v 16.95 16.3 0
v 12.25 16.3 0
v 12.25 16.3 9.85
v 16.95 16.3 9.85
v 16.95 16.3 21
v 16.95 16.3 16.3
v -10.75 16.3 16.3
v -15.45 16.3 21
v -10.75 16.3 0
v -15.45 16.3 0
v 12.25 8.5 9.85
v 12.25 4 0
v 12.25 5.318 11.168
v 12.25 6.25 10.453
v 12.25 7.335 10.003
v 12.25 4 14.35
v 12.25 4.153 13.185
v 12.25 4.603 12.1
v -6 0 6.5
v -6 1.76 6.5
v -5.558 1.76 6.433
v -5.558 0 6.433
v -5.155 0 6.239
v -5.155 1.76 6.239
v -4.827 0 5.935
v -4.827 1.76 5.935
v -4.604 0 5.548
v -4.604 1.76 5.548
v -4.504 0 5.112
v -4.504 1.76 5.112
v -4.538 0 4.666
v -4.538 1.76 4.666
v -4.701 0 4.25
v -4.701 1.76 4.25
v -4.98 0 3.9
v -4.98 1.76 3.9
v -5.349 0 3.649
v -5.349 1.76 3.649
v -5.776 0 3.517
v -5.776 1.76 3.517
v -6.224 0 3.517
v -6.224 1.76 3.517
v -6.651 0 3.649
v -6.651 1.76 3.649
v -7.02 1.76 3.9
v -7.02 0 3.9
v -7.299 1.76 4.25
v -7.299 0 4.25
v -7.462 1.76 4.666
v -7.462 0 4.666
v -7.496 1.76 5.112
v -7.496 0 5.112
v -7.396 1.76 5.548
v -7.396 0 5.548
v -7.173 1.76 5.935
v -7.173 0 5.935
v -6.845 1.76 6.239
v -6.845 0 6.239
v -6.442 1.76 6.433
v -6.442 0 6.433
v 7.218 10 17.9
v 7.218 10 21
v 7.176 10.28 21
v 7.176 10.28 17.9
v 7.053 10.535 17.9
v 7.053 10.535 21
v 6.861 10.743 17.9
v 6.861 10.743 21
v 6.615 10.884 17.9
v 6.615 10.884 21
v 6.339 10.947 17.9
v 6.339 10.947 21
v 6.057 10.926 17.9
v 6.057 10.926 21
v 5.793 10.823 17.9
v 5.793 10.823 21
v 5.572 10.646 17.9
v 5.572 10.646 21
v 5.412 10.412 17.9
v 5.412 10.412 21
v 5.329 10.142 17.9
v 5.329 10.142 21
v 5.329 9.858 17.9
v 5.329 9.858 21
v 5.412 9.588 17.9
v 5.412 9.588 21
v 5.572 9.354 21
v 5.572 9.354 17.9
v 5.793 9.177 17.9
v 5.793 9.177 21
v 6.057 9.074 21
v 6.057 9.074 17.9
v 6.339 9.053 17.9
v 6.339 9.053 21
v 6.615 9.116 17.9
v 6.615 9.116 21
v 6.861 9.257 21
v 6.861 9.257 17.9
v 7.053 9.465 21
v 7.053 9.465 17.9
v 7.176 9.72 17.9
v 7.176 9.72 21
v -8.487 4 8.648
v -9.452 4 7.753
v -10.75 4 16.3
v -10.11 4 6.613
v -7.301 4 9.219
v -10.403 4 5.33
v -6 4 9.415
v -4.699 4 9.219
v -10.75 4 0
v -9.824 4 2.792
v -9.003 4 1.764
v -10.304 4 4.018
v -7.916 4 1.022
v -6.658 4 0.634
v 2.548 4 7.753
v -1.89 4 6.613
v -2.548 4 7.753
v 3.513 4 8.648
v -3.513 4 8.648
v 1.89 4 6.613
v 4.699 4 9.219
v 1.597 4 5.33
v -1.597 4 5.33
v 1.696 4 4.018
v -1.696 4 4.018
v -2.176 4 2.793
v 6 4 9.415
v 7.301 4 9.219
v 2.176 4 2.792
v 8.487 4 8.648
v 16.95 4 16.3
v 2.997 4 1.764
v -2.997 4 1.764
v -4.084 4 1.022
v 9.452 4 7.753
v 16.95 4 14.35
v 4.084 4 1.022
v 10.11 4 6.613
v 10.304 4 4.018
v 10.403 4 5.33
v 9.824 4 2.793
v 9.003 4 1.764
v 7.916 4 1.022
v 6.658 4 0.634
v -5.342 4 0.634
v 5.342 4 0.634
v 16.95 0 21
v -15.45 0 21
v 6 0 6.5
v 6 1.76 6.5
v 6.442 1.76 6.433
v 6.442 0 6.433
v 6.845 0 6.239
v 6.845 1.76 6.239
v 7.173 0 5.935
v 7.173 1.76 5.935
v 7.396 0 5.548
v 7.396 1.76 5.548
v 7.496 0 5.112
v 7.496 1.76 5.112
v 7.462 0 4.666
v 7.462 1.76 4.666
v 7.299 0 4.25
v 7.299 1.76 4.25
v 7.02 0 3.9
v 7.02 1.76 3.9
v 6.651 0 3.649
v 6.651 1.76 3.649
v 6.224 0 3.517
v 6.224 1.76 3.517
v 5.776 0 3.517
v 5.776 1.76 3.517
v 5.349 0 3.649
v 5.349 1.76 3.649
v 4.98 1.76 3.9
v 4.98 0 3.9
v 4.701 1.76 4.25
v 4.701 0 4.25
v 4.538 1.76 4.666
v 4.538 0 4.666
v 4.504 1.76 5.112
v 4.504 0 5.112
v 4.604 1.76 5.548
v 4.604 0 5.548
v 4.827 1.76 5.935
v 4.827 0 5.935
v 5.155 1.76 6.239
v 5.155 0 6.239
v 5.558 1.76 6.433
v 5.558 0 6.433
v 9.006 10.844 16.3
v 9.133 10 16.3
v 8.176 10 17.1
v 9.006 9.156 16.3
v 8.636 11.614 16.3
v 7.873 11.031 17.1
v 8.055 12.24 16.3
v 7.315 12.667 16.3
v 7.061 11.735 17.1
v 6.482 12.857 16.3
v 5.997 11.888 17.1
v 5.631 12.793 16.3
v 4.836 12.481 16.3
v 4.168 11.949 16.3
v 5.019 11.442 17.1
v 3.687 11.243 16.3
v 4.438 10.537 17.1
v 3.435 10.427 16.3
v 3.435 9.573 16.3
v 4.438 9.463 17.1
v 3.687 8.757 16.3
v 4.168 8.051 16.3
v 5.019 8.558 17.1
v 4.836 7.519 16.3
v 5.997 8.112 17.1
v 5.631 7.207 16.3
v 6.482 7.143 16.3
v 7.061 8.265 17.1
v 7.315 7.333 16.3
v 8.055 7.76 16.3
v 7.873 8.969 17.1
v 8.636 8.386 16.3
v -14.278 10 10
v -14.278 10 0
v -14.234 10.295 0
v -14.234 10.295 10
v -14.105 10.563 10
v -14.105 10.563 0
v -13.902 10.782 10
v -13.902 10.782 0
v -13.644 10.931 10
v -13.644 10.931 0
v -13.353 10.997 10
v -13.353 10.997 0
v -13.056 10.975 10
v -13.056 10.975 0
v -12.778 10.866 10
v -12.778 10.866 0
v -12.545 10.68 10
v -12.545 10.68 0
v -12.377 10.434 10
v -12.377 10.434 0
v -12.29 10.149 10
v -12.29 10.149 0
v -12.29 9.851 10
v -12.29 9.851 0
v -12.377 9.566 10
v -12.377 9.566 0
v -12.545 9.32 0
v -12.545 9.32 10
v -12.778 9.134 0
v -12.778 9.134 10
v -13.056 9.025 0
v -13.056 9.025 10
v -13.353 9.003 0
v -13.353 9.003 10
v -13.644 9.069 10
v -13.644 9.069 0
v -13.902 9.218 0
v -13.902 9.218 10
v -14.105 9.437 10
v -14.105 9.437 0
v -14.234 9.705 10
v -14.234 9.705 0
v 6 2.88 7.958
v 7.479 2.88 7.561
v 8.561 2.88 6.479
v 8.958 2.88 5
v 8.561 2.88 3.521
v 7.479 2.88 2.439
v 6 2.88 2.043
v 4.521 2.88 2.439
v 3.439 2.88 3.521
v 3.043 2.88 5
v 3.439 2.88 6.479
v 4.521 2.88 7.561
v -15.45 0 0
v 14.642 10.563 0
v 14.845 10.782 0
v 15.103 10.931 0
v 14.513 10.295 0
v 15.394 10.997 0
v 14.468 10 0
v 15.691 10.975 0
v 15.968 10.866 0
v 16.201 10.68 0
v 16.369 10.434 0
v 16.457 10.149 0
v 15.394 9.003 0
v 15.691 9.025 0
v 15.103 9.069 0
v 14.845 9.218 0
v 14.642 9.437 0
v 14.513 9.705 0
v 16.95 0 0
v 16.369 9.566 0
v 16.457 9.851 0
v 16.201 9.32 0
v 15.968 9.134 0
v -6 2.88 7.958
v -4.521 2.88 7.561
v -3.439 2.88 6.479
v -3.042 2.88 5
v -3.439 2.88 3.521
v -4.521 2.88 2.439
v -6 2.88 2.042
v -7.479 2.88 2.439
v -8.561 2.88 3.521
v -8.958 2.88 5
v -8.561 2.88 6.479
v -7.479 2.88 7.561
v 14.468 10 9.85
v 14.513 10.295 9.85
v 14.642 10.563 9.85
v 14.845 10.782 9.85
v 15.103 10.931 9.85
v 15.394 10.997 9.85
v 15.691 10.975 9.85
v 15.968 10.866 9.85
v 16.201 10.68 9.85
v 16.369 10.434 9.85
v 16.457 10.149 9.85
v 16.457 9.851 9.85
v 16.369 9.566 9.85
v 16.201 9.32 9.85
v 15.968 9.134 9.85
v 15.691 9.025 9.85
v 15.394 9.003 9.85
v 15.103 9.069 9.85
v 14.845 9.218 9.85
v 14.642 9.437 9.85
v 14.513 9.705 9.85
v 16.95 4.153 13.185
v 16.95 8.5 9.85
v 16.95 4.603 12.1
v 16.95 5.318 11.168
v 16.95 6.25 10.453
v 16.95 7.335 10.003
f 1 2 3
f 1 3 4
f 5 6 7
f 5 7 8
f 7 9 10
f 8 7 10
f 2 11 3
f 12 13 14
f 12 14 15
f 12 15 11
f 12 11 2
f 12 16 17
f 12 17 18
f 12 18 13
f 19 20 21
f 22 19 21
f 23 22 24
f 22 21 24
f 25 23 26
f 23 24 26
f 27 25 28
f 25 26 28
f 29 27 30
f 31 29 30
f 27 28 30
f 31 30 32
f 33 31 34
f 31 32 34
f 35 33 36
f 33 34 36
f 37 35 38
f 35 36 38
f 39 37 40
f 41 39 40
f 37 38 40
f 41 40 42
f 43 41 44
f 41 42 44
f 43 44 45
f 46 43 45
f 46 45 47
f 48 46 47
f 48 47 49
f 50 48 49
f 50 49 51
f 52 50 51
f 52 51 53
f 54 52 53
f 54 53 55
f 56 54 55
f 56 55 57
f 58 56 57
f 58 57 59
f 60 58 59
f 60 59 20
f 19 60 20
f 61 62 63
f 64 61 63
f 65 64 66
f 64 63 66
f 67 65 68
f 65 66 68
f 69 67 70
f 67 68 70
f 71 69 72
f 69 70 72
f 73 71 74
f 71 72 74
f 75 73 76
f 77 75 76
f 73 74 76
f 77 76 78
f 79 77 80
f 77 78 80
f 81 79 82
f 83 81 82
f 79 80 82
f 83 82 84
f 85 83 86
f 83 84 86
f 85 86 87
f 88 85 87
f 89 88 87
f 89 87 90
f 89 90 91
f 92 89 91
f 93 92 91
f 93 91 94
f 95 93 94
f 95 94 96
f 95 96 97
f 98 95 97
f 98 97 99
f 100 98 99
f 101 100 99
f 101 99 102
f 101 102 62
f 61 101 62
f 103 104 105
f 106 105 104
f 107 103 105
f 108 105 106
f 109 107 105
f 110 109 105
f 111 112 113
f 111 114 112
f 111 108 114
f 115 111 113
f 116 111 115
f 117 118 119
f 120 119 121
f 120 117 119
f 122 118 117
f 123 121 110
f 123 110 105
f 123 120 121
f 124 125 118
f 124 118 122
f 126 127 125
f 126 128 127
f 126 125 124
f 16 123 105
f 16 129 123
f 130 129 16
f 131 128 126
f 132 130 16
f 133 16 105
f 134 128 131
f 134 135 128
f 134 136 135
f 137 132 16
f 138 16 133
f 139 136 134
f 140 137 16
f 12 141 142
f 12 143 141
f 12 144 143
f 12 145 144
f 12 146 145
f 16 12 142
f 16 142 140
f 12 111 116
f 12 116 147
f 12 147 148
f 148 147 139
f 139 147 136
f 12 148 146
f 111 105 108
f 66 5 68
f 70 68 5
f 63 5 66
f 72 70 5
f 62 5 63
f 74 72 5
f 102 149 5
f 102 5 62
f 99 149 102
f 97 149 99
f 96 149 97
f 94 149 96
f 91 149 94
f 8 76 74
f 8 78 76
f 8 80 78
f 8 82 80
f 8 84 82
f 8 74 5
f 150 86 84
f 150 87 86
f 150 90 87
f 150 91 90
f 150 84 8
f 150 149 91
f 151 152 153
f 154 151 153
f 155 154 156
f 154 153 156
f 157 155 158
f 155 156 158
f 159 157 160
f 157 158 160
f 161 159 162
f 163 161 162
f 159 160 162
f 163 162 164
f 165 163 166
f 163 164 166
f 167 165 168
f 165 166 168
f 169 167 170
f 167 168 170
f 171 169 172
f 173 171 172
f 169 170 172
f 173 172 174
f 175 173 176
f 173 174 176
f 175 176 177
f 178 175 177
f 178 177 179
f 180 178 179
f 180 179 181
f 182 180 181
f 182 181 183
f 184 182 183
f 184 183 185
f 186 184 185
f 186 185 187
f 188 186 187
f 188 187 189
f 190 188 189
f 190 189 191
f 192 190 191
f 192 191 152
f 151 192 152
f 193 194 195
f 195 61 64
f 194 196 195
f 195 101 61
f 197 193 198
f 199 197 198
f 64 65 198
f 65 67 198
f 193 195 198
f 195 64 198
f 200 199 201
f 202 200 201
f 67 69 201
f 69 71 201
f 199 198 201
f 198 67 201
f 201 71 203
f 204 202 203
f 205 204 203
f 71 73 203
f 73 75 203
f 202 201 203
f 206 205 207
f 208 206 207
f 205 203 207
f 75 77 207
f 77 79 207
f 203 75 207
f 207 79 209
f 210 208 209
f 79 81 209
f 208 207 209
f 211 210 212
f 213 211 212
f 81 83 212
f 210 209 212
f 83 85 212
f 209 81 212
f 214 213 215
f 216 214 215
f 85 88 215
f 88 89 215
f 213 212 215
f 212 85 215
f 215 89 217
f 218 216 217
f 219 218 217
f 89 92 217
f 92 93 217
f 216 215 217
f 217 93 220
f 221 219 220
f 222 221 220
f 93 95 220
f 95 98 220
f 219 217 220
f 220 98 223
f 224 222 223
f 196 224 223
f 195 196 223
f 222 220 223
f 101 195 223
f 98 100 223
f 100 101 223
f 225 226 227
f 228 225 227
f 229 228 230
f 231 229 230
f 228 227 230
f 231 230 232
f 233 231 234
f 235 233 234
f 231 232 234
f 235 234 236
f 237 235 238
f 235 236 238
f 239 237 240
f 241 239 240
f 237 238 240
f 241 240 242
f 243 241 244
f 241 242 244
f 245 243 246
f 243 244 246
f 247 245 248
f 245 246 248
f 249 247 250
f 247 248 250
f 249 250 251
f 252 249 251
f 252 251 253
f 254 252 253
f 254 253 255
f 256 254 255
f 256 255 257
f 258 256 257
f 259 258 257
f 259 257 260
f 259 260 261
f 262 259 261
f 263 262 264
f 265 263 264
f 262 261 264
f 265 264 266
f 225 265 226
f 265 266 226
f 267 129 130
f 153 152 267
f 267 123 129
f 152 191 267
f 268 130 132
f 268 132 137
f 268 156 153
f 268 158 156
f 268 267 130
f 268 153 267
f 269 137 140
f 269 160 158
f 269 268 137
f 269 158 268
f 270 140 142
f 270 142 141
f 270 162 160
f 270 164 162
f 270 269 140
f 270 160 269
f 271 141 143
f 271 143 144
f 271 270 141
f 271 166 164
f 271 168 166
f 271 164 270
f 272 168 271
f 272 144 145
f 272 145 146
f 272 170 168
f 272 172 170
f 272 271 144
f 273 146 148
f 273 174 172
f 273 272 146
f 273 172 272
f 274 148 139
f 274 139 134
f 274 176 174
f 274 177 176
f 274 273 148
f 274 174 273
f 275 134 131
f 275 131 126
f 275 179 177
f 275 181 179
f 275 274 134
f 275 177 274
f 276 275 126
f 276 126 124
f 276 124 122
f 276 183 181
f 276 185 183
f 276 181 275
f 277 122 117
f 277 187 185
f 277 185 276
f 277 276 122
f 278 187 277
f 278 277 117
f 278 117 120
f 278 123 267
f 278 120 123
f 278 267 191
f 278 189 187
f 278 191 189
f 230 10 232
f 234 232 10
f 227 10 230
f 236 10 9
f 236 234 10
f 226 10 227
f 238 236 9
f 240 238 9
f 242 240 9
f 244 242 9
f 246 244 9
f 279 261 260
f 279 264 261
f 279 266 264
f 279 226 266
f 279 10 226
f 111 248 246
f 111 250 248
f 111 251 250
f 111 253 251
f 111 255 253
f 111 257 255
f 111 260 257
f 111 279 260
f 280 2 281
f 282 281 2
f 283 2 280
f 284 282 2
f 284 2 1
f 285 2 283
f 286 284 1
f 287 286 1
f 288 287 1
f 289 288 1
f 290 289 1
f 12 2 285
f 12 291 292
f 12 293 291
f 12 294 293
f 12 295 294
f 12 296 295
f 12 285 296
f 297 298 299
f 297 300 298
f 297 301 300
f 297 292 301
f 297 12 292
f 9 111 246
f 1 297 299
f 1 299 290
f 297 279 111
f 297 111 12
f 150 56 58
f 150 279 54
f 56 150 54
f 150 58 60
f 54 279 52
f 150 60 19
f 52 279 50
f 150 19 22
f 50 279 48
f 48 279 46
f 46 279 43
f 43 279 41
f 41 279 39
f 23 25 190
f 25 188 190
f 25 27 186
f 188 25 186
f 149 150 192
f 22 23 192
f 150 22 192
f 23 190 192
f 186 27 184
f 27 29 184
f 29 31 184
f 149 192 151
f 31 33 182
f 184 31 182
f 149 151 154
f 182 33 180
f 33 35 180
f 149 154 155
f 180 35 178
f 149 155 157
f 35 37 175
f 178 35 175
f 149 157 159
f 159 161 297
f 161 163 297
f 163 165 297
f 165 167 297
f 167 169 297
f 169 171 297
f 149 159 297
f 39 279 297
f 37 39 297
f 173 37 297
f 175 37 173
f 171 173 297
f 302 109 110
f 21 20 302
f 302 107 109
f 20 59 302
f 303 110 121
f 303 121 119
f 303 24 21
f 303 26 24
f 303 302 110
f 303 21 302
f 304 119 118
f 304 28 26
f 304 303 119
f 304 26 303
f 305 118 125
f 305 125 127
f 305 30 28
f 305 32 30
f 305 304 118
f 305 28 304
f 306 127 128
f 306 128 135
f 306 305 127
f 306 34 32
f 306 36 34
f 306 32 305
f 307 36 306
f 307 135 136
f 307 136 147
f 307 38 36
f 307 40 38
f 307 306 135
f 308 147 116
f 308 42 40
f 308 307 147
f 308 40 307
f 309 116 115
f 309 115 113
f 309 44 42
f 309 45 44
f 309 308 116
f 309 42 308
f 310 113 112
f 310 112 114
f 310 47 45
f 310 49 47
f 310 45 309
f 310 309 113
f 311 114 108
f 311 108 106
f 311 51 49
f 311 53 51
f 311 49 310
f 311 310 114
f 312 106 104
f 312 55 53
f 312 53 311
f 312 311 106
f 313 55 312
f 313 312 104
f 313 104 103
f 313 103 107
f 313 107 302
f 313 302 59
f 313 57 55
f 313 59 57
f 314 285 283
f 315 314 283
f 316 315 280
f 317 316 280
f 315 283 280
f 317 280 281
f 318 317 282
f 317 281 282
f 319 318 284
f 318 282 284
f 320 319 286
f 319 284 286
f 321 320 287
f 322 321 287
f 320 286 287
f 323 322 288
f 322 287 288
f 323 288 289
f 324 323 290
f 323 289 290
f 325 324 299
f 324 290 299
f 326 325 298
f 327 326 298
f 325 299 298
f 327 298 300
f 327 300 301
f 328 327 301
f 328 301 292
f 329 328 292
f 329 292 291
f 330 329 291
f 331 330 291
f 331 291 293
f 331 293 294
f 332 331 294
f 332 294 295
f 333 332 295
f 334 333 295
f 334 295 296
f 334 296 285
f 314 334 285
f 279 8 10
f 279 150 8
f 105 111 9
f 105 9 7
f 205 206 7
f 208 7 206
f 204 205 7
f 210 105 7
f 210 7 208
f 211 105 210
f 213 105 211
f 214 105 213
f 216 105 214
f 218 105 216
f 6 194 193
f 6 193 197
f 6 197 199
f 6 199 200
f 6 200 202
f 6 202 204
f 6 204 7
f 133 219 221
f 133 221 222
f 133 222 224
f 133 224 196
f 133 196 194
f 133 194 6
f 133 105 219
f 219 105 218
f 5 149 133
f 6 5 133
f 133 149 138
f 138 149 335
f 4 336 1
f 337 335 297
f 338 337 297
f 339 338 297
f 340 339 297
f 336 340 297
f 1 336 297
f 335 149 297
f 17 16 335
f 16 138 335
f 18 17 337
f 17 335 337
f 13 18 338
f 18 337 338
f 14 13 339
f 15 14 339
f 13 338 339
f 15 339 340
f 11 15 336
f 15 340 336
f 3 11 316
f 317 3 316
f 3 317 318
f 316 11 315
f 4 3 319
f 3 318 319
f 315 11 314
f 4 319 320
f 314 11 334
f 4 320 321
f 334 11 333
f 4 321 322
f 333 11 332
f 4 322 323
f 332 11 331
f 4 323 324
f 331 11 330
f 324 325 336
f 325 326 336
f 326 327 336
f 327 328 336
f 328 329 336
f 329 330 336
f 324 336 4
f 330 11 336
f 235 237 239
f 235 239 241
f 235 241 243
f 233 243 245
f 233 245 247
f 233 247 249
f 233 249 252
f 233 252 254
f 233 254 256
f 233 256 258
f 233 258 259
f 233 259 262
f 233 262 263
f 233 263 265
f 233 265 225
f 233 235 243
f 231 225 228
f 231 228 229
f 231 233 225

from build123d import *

# Parameters (mm, degrees)
ESQUISSE1_W             = 32.4
ESQUISSE1_H             = 21
BOSS_EXTRU_1_DEPTH      = 4
ESQUISSE2_W             = 4.7
ESQUISSE2_H             = 9.85
BOSS_EXTRU_2_DEPTH      = 12.3
ENL_V_MAT_EXTRU_1_REACH = 33.528
ESQUISSE3_R             = 0.95
CHANFREIN1_SIZE         = 1.915
CHANFREIN1_SIZE2        = 1.6
ESQUISSE4_R             = 1
ENL_V_MAT_EXTRU_2_DEPTH = 10
CONG_1_R                = 4.5
ESQUISSE5_R             = 1.5
ENL_V_MAT_EXTRU_3_DEPTH = 30.657924742
CHANFREIN2_SIZE         = 2.915
CHANFREIN2_SIZE2        = 2.24


with BuildPart() as part:
    # Esquisse1 → Boss.-Extru.1 (new body)
    with BuildSketch(Plane(origin=(0, 0, 0), x_dir=(1, 0, 0), z_dir=(0, 1, 0))):
        with Locations((0.75, -10.5)):
            Rectangle(ESQUISSE1_W, ESQUISSE1_H)
    extrude(amount=BOSS_EXTRU_1_DEPTH)

    # Esquisse2 → Boss.-Extru.2 (add)
    with BuildSketch(Plane(origin=(0, 4, 0), x_dir=(1, 0, 0), z_dir=(0, 1, 0))):
        Polygon((-15.45, 0), (-10.75, 0), (-10.75, -16.3), (16.95, -16.3), (16.95, -21), (-15.45, -21), align=None)
        with Locations((14.6, -4.925)):
            Rectangle(ESQUISSE2_W, ESQUISSE2_H)
    extrude(amount=BOSS_EXTRU_2_DEPTH)

    # Esquisse3 → Enlèv. mat.-Extru.1 (cut, up to next)
    with BuildSketch(Plane.XY.offset(21), mode=Mode.PRIVATE) as enl_v_mat_extru_1_sk1:
        with Locations((6.268372061, 10)):
            Circle(ESQUISSE3_R)
    enl_v_mat_extru_1_tool1 = extrude(enl_v_mat_extru_1_sk1.sketch, amount=-ENL_V_MAT_EXTRU_1_REACH, mode=Mode.PRIVATE) & part.part
    add(enl_v_mat_extru_1_tool1.solids().sort_by_distance((6.268372, 10, 21))[0], mode=Mode.SUBTRACT)

    # Chanfrein1
    chanfrein1_edges = [part.edges().sort_by_distance(p)[0] for p in [
        (5.318372061, 10, 16.3),
    ]]
    chanfrein1_side = [part.faces().sort_by_distance(p)[0] for p in [
        (3.073412496, 10.15125873, 16.3),
    ]]
    chamfer(chanfrein1_edges, length=CHANFREIN1_SIZE, length2=CHANFREIN1_SIZE2, reference=chanfrein1_side[0])

    # Esquisse4 → Enlèv. mat.-Extru.2 (cut)
    with BuildSketch(Plane(origin=(0, 0, 0), x_dir=(-1, 0, 0), z_dir=(0, 0, -1))):
        with Locations((-15.468268339, 10)):
            Circle(ESQUISSE4_R)
        with Locations((13.27835463, 10)):
            Circle(ESQUISSE4_R)
    extrude(amount=-ENL_V_MAT_EXTRU_2_DEPTH, mode=Mode.SUBTRACT)

    # Congé1
    cong_1_edges = [part.edges().sort_by_distance(p)[0] for p in [
        (14.6, 4, 9.85),
    ]]
    fillet(cong_1_edges, radius=CONG_1_R)

    # Esquisse5 → Enlèv. mat.-Extru.3 (cut, through all)
    with BuildSketch(Plane(origin=(0, 4, 0), x_dir=(1, 0, 0), z_dir=(0, 1, 0))):
        with Locations(Location((-6, -5, 0), (0, 0, 270))):
            Circle(ESQUISSE5_R)
        with Locations(Location((6, -5, 0), (0, 0, 270))):
            Circle(ESQUISSE5_R)
    extrude(amount=-ENL_V_MAT_EXTRU_3_DEPTH, mode=Mode.SUBTRACT)

    # Chanfrein2
    chanfrein2_edges = [part.edges().sort_by_distance(p)[0] for p in [
        (-6, 4, 3.5),
        (6, 4, 3.5),
    ]]
    chanfrein2_side = [part.faces().sort_by_distance(p)[0] for p in [
        (1.12179718, 4, 8.448141802),
    ]]
    chamfer(chanfrein2_edges, length=CHANFREIN2_SIZE, length2=CHANFREIN2_SIZE2, reference=chanfrein2_side[0])


solid = part.part
